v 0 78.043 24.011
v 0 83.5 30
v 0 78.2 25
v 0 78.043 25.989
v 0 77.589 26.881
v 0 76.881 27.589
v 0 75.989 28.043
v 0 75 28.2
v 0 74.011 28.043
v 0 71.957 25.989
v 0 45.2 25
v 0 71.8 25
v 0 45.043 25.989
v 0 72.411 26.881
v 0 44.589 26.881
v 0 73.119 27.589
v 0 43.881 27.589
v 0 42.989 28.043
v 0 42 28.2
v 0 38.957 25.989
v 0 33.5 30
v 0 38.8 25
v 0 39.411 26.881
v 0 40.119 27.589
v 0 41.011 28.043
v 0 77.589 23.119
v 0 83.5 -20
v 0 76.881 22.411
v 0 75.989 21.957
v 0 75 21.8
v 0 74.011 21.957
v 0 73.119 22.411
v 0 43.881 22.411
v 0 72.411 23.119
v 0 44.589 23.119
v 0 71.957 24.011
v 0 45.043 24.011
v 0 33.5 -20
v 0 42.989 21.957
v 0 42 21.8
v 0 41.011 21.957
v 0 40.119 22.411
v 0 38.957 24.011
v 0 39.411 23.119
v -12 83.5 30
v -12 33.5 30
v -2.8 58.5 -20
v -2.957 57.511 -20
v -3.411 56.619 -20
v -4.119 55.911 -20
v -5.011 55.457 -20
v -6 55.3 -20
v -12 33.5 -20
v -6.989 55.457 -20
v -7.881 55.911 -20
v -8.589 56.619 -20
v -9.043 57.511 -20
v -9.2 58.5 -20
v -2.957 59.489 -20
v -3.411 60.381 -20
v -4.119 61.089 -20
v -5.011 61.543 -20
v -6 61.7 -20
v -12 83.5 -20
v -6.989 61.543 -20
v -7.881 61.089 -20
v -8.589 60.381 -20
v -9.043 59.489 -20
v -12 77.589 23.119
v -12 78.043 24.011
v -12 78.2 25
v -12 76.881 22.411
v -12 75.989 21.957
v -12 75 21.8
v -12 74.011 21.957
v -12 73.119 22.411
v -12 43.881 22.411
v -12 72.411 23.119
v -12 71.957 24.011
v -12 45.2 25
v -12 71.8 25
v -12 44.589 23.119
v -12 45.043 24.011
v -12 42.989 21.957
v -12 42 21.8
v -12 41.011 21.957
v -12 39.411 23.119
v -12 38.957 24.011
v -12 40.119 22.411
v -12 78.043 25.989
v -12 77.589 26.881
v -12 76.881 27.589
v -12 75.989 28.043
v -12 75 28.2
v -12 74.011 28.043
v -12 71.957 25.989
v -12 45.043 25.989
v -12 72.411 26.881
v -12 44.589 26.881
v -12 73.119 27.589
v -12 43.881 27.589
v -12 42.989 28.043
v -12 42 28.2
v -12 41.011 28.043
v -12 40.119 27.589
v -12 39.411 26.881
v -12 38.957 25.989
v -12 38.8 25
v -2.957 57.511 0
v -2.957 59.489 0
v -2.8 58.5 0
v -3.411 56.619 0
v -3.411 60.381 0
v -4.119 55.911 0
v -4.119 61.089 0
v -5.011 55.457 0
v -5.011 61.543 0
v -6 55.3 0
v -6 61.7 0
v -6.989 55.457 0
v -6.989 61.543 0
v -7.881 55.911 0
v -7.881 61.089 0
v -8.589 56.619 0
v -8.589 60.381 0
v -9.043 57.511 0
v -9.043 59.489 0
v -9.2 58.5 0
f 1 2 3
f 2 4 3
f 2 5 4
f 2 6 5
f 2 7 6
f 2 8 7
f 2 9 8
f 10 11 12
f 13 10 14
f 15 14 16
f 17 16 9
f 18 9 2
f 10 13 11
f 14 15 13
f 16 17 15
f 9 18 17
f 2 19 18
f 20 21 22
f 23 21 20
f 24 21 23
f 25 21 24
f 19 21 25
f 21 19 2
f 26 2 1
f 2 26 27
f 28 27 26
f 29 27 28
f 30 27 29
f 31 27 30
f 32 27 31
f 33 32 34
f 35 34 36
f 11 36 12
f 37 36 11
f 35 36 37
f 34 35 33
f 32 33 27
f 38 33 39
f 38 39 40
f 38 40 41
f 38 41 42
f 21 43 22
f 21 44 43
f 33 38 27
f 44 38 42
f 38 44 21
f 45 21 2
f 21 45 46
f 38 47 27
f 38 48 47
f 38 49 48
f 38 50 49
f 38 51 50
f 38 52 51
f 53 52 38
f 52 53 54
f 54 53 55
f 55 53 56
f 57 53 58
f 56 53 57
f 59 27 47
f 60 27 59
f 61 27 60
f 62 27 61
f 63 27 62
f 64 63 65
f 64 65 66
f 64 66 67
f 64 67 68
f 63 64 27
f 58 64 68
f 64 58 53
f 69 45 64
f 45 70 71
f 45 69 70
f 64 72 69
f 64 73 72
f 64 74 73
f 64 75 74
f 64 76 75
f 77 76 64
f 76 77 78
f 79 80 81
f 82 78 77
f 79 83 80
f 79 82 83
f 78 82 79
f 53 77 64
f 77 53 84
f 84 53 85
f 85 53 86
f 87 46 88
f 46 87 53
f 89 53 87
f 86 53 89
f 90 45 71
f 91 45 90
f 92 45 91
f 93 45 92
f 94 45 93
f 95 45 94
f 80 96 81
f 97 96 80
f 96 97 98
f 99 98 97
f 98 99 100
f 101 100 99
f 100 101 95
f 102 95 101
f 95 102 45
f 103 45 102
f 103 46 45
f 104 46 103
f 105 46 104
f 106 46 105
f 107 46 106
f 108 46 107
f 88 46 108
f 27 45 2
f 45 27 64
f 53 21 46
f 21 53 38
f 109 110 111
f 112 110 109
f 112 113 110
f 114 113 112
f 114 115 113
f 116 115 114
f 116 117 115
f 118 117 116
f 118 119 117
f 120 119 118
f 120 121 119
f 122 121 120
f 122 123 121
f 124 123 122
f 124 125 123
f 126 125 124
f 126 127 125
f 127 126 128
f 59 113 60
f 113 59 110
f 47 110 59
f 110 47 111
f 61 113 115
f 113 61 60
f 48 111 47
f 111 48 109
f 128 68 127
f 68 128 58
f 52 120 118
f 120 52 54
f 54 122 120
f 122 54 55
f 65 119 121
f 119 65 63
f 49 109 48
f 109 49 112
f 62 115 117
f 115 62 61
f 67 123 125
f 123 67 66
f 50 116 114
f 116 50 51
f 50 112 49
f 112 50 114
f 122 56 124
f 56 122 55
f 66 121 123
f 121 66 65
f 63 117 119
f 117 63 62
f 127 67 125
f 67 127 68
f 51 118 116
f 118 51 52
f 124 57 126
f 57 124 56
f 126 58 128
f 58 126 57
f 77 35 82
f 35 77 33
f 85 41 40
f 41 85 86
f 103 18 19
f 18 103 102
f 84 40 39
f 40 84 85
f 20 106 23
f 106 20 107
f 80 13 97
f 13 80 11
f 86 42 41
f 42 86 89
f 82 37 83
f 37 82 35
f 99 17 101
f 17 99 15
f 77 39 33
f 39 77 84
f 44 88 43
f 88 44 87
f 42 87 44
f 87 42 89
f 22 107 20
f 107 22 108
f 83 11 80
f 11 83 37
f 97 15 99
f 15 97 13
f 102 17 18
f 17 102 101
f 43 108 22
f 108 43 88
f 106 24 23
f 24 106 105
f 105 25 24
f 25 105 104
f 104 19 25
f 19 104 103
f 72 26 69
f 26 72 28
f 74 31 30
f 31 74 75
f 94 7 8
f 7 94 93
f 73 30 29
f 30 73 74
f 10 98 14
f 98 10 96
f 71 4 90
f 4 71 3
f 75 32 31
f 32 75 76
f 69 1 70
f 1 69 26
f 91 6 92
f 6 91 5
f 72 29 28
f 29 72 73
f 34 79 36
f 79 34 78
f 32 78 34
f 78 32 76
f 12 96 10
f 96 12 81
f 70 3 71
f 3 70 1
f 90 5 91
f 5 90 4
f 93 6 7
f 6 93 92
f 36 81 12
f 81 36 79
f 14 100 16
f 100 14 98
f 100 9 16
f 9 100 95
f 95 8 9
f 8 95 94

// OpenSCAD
difference(){
    front();
        
        

    translate([65,115,2]){
    rotate([0,0,180]){
        car();
        }
    }
    
    
    translate([-6,58.5,-30]){
    cylinder(30, 3.2, 3.2, $fn=20);
}
translate([-15,42,25]){
    rotate([0,90,0]){
        cylinder(30, 3.2, 3.2, $fn=20);
    }
}

translate([-15,75,25]){
    rotate([0,90,0]){
        cylinder(30, 3.2, 3.2, $fn=20);
    }
}
    
    
    
    
}



module front(){
    
    translate([-12,33.5,-20]){
        cube([12,50,50]);
    }
    /*
    translate([0,-2,0]){
        cube([10,119,39]);
        }
    translate([0,-2,0]){
        cube([50,15,39]);
        }
    
    translate([0,102,0]){
        cube([50,15,39]);
        }
    */
    }
        
module car(){    
    difference()
    {
        cube([55,115,35]);

        translate([10,10,-2])
        cube(95,90,55);
    }
    
}
